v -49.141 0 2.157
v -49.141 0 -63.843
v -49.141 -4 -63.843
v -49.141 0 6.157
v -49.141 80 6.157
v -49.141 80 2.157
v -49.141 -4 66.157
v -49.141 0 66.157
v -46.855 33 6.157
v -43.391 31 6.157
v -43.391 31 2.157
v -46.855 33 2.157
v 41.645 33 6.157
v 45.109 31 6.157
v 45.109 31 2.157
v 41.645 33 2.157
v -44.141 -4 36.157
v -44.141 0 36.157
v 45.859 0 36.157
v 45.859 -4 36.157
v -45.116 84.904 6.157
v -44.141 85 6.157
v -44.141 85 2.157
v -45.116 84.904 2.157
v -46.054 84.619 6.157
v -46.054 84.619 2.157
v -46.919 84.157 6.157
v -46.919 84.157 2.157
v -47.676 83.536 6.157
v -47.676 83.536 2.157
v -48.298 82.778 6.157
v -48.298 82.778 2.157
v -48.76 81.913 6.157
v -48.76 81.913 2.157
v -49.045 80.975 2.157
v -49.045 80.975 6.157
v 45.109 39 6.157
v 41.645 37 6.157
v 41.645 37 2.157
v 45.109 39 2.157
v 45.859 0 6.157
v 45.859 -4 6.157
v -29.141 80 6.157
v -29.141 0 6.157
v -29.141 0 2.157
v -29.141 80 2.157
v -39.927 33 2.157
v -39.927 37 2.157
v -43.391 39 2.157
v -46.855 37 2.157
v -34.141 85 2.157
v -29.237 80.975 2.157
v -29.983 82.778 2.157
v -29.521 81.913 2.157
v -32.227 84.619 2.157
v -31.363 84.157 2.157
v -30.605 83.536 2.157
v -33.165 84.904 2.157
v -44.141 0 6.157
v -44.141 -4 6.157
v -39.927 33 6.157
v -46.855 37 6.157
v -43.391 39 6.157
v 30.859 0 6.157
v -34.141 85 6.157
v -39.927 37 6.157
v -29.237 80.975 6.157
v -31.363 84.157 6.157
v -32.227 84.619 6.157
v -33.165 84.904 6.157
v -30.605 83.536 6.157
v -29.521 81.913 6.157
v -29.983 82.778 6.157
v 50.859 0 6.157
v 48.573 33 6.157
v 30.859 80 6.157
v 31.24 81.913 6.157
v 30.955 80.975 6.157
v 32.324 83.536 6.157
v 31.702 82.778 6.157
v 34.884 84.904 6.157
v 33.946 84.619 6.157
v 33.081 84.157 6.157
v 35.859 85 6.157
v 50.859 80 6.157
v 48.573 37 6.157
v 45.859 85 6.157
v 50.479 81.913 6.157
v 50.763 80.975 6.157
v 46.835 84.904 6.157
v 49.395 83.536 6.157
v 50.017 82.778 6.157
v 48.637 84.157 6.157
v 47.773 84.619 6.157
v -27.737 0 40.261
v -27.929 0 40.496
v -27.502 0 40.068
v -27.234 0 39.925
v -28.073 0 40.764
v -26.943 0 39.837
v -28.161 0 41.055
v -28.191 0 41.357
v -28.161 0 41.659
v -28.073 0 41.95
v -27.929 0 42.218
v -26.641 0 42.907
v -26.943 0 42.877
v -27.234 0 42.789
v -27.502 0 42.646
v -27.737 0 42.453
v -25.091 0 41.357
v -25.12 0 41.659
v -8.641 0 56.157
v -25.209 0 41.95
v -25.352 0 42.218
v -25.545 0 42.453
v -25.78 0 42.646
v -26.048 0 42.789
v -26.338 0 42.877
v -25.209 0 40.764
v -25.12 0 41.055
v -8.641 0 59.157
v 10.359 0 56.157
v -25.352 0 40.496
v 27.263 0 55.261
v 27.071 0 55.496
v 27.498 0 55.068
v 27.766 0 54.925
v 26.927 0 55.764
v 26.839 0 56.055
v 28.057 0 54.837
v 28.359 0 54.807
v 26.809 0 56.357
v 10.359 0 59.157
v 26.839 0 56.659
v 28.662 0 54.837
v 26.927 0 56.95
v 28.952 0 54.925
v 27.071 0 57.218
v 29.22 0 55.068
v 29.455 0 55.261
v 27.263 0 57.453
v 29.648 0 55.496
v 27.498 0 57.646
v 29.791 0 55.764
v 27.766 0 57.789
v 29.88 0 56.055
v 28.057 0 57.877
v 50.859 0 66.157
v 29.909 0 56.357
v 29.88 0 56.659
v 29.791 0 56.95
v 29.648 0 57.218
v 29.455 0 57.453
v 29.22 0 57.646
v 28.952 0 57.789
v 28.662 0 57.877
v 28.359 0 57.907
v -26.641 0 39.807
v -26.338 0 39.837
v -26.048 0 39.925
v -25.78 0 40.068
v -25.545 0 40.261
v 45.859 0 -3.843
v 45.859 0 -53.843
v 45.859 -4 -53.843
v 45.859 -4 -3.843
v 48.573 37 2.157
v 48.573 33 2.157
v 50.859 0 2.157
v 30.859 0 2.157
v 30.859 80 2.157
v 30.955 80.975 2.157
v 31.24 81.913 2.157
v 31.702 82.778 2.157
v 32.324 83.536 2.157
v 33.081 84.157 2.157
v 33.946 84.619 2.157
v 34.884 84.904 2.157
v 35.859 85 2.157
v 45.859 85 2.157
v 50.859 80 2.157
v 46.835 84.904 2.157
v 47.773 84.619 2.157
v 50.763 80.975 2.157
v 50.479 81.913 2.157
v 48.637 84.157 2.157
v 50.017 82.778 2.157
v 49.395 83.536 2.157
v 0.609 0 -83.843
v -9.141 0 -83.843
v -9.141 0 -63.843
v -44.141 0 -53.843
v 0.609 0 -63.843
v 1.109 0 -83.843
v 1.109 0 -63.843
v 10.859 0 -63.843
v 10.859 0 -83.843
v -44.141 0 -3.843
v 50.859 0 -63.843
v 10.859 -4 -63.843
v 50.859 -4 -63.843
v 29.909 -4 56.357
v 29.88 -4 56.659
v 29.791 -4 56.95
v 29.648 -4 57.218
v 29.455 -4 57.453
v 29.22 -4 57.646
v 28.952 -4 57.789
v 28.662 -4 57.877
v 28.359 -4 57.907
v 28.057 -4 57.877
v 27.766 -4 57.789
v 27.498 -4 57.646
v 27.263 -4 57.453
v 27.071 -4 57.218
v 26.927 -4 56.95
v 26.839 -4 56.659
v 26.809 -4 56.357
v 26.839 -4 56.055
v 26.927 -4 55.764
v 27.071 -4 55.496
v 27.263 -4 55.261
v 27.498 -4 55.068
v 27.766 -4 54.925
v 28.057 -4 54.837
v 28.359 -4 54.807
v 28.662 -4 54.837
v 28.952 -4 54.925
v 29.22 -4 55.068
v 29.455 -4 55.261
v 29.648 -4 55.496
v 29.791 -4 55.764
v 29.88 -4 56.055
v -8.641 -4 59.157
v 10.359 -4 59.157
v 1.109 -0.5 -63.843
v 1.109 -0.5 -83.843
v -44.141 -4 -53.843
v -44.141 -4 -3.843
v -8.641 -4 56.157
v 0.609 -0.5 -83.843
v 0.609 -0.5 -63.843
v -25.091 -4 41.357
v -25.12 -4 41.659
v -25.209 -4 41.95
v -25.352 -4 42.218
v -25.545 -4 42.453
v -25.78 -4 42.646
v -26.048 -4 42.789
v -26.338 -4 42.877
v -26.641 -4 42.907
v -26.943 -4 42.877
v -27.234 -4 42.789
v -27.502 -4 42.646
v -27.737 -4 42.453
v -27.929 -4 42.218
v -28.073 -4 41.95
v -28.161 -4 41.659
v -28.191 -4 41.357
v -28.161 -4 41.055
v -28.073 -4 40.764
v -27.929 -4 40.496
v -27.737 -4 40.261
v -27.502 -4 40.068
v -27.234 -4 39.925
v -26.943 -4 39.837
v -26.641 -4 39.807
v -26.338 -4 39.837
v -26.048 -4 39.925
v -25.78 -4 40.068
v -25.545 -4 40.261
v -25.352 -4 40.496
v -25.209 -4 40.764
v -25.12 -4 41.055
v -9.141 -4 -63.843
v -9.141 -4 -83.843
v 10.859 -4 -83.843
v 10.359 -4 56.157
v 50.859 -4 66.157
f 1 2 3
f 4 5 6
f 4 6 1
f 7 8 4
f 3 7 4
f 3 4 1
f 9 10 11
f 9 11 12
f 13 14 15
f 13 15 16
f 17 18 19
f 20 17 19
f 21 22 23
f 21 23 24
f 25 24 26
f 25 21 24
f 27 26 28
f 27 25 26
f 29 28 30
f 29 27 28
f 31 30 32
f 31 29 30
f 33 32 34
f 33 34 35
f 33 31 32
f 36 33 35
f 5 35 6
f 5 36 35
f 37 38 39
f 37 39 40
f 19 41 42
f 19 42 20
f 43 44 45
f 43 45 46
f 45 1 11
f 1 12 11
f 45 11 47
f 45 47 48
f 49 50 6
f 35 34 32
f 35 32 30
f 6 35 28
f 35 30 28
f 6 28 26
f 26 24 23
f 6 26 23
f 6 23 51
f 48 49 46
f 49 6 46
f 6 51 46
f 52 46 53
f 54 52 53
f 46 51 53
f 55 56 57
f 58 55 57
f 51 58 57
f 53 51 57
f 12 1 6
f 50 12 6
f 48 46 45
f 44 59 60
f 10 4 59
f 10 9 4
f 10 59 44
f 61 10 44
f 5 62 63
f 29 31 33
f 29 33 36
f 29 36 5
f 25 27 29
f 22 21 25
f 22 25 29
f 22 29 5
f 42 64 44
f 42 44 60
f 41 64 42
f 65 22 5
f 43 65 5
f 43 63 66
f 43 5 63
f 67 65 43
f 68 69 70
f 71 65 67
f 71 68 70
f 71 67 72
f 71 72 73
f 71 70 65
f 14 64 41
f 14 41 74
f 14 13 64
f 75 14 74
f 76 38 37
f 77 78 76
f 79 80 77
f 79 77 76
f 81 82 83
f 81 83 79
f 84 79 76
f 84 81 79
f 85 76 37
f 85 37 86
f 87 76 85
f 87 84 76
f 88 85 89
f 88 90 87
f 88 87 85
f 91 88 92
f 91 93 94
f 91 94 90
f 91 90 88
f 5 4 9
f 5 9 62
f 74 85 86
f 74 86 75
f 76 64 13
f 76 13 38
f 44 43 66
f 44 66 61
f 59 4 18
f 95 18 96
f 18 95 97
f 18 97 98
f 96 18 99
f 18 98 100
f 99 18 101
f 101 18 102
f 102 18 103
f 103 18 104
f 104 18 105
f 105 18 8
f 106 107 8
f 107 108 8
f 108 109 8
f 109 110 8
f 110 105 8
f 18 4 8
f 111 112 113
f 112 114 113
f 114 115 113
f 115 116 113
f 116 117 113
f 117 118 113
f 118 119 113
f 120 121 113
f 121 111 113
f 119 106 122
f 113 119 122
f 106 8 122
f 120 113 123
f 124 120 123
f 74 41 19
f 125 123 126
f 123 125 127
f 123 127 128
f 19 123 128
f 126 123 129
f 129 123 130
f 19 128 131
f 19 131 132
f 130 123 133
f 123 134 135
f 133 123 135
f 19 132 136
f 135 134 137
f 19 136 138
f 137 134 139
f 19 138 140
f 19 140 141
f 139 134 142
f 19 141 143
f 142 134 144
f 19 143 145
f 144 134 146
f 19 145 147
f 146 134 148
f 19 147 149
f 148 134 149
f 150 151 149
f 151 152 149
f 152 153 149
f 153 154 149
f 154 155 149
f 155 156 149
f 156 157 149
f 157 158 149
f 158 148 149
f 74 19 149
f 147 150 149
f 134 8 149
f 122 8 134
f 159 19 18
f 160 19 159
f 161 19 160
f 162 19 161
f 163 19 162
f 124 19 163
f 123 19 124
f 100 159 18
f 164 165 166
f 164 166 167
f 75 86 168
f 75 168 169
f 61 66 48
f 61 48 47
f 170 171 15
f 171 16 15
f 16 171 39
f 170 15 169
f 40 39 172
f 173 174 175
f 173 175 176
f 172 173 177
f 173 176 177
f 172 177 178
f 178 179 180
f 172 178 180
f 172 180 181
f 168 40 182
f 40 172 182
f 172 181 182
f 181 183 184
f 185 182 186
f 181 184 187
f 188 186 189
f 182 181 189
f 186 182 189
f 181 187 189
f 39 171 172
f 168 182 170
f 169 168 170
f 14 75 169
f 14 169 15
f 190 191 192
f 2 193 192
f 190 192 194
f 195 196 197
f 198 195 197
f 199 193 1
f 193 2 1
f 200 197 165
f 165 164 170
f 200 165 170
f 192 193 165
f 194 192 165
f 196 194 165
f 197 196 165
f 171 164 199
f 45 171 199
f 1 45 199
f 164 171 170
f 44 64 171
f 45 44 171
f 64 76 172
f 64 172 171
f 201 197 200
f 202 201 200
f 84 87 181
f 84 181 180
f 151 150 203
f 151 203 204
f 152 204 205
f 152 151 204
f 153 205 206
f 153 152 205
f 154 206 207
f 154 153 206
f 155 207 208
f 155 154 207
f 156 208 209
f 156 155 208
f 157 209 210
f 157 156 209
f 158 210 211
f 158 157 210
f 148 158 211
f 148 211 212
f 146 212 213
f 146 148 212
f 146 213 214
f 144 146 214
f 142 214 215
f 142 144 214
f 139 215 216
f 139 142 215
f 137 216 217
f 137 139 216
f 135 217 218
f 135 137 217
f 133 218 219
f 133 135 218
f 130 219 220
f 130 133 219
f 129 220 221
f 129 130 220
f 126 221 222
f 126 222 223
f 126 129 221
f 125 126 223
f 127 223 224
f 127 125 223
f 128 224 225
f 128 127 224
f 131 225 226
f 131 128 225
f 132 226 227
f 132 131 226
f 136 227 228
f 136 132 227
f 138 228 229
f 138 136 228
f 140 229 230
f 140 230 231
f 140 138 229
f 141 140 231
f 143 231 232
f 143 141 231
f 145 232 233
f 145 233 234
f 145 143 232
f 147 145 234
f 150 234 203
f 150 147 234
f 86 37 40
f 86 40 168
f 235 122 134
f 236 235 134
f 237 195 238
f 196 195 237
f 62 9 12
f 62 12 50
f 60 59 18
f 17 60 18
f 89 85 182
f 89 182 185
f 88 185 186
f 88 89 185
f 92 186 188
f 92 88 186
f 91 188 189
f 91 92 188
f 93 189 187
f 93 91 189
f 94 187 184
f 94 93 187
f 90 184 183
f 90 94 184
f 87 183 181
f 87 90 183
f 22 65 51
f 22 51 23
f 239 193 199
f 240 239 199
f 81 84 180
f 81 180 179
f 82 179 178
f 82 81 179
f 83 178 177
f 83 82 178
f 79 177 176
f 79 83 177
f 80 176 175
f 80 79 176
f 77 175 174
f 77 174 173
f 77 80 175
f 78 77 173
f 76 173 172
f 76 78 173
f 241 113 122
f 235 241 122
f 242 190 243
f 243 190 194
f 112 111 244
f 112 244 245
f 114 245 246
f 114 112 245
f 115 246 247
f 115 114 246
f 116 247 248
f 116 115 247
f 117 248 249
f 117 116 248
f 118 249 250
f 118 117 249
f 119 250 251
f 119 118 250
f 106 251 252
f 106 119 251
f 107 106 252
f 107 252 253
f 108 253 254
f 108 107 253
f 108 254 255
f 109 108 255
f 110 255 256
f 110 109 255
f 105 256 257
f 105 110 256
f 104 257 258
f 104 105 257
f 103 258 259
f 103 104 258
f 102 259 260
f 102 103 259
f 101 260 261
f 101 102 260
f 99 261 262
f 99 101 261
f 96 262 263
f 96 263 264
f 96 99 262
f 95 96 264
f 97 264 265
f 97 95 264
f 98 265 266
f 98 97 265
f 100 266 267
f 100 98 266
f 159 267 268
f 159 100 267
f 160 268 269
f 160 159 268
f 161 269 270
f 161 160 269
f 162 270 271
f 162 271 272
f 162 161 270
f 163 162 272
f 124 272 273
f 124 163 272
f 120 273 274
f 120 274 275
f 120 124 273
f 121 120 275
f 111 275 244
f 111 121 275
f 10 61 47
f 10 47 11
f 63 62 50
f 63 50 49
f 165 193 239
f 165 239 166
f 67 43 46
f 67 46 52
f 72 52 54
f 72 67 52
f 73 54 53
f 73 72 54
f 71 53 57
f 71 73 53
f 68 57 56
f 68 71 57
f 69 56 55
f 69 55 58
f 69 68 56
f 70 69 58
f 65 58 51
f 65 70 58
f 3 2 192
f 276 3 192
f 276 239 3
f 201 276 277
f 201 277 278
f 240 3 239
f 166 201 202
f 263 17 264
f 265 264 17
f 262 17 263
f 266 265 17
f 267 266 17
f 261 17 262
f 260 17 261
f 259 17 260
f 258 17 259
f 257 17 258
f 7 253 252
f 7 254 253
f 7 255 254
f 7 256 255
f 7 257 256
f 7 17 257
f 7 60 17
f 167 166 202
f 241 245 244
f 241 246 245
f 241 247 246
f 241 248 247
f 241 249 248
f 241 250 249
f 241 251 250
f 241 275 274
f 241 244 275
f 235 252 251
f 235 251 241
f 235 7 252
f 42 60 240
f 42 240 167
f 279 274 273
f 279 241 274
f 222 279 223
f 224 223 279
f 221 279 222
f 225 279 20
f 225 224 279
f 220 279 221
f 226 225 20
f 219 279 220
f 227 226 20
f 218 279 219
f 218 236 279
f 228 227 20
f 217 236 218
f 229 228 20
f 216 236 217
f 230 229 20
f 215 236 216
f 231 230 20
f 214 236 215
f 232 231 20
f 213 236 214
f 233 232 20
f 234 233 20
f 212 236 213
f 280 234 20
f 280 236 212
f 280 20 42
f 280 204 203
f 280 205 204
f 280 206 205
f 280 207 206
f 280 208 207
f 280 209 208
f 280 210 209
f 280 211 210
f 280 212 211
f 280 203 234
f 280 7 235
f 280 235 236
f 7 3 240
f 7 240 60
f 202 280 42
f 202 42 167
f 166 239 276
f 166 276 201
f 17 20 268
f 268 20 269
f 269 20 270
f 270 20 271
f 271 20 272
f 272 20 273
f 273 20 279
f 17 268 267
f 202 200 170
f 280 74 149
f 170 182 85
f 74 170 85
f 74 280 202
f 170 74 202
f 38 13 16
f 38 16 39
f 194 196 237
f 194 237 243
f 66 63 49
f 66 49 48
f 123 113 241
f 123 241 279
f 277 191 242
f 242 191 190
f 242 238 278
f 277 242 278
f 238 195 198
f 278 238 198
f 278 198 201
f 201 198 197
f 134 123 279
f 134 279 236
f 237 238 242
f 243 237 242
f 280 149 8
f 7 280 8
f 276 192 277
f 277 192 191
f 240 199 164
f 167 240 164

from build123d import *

# Parameters (mm, degrees)
F0_W     = 90
F0_H     = 50
F0_H_2   = 30
F0_R     = 1.55
F0_W_2   = 19
F0_H_3   = 3
F1_DEPTH = 4
F3_DEPTH = 4
F4_W     = 0.5
F4_H     = 20
F5_DEPTH = 0.5


with BuildPart() as f1:
    # F0 (on Front) → F1 (new body)
    with BuildSketch(Plane.XZ):
        Polygon((50.859297, 66.157015), (-49.140703, 66.157015), (-49.140703, -63.842985), (-9.140703, -63.842985), (-9.140703, -83.842985), (10.859297, -83.842985), (10.859297, -63.842985), (50.859297, -63.842985), align=None)
        with Locations((0.859297, -28.842985)):
            Rectangle(F0_W, F0_H, mode=Mode.SUBTRACT)
        with Locations((0.859297, 21.157015)):
            Rectangle(F0_W, F0_H_2, mode=Mode.SUBTRACT)
        with Locations((-26.640703, 41.357015)):
            Circle(F0_R, mode=Mode.SUBTRACT)
        with Locations((0.859297, 57.657015)):
            Rectangle(F0_W_2, F0_H_3, mode=Mode.SUBTRACT)
        with Locations((28.359297, 56.357015)):
            Circle(F0_R, mode=Mode.SUBTRACT)
    extrude(amount=F1_DEPTH)

    # F2 (on face) → F3 (join)
    with BuildSketch(Plane.XY.offset(6.157015)):
        with BuildLine():
            Line((-49.140703, 80), (-49.140703, 0))
            Line((-49.140703, 0), (-29.140703, 0))
            Line((-29.140703, 0), (-29.140703, 80))
            ThreePointArc((-29.140703, 80), (-30.605169, 83.535534), (-34.140703, 85))
            Line((-34.140703, 85), (-44.140703, 85))
            ThreePointArc((-44.140703, 85), (-47.676237, 83.535534), (-49.140703, 80))
        make_face()
        Polygon((-46.854805, 37), (-43.390703, 39), (-39.926602, 37), (-39.926602, 33), (-43.390703, 31), (-46.854805, 33), align=None, mode=Mode.SUBTRACT)
        with BuildLine():
            Line((30.859297, 80), (30.859297, 0))
            Line((30.859297, 0), (50.859297, 0))
            Line((50.859297, 0), (50.859297, 80))
            ThreePointArc((50.859297, 80), (49.394831, 83.535534), (45.859297, 85))
            Line((45.859297, 85), (35.859297, 85))
            ThreePointArc((35.859297, 85), (32.323763, 83.535534), (30.859297, 80))
        make_face()
        Polygon((45.109297, 39), (48.573398, 37), (48.573398, 33), (45.109297, 31), (41.645195, 33), (41.645195, 37), align=None, mode=Mode.SUBTRACT)
    extrude(amount=-F3_DEPTH)

    # F4 (on face) → F5 (cut)
    with BuildSketch(Plane(origin=(0, 0, 0), x_dir=(-1, 0, 0), z_dir=(0, 1, 0))):
        with Locations((-0.859297, -73.842985)):
            Rectangle(F4_W, F4_H)
    extrude(amount=-F5_DEPTH, mode=Mode.SUBTRACT)


solid = f1.part
